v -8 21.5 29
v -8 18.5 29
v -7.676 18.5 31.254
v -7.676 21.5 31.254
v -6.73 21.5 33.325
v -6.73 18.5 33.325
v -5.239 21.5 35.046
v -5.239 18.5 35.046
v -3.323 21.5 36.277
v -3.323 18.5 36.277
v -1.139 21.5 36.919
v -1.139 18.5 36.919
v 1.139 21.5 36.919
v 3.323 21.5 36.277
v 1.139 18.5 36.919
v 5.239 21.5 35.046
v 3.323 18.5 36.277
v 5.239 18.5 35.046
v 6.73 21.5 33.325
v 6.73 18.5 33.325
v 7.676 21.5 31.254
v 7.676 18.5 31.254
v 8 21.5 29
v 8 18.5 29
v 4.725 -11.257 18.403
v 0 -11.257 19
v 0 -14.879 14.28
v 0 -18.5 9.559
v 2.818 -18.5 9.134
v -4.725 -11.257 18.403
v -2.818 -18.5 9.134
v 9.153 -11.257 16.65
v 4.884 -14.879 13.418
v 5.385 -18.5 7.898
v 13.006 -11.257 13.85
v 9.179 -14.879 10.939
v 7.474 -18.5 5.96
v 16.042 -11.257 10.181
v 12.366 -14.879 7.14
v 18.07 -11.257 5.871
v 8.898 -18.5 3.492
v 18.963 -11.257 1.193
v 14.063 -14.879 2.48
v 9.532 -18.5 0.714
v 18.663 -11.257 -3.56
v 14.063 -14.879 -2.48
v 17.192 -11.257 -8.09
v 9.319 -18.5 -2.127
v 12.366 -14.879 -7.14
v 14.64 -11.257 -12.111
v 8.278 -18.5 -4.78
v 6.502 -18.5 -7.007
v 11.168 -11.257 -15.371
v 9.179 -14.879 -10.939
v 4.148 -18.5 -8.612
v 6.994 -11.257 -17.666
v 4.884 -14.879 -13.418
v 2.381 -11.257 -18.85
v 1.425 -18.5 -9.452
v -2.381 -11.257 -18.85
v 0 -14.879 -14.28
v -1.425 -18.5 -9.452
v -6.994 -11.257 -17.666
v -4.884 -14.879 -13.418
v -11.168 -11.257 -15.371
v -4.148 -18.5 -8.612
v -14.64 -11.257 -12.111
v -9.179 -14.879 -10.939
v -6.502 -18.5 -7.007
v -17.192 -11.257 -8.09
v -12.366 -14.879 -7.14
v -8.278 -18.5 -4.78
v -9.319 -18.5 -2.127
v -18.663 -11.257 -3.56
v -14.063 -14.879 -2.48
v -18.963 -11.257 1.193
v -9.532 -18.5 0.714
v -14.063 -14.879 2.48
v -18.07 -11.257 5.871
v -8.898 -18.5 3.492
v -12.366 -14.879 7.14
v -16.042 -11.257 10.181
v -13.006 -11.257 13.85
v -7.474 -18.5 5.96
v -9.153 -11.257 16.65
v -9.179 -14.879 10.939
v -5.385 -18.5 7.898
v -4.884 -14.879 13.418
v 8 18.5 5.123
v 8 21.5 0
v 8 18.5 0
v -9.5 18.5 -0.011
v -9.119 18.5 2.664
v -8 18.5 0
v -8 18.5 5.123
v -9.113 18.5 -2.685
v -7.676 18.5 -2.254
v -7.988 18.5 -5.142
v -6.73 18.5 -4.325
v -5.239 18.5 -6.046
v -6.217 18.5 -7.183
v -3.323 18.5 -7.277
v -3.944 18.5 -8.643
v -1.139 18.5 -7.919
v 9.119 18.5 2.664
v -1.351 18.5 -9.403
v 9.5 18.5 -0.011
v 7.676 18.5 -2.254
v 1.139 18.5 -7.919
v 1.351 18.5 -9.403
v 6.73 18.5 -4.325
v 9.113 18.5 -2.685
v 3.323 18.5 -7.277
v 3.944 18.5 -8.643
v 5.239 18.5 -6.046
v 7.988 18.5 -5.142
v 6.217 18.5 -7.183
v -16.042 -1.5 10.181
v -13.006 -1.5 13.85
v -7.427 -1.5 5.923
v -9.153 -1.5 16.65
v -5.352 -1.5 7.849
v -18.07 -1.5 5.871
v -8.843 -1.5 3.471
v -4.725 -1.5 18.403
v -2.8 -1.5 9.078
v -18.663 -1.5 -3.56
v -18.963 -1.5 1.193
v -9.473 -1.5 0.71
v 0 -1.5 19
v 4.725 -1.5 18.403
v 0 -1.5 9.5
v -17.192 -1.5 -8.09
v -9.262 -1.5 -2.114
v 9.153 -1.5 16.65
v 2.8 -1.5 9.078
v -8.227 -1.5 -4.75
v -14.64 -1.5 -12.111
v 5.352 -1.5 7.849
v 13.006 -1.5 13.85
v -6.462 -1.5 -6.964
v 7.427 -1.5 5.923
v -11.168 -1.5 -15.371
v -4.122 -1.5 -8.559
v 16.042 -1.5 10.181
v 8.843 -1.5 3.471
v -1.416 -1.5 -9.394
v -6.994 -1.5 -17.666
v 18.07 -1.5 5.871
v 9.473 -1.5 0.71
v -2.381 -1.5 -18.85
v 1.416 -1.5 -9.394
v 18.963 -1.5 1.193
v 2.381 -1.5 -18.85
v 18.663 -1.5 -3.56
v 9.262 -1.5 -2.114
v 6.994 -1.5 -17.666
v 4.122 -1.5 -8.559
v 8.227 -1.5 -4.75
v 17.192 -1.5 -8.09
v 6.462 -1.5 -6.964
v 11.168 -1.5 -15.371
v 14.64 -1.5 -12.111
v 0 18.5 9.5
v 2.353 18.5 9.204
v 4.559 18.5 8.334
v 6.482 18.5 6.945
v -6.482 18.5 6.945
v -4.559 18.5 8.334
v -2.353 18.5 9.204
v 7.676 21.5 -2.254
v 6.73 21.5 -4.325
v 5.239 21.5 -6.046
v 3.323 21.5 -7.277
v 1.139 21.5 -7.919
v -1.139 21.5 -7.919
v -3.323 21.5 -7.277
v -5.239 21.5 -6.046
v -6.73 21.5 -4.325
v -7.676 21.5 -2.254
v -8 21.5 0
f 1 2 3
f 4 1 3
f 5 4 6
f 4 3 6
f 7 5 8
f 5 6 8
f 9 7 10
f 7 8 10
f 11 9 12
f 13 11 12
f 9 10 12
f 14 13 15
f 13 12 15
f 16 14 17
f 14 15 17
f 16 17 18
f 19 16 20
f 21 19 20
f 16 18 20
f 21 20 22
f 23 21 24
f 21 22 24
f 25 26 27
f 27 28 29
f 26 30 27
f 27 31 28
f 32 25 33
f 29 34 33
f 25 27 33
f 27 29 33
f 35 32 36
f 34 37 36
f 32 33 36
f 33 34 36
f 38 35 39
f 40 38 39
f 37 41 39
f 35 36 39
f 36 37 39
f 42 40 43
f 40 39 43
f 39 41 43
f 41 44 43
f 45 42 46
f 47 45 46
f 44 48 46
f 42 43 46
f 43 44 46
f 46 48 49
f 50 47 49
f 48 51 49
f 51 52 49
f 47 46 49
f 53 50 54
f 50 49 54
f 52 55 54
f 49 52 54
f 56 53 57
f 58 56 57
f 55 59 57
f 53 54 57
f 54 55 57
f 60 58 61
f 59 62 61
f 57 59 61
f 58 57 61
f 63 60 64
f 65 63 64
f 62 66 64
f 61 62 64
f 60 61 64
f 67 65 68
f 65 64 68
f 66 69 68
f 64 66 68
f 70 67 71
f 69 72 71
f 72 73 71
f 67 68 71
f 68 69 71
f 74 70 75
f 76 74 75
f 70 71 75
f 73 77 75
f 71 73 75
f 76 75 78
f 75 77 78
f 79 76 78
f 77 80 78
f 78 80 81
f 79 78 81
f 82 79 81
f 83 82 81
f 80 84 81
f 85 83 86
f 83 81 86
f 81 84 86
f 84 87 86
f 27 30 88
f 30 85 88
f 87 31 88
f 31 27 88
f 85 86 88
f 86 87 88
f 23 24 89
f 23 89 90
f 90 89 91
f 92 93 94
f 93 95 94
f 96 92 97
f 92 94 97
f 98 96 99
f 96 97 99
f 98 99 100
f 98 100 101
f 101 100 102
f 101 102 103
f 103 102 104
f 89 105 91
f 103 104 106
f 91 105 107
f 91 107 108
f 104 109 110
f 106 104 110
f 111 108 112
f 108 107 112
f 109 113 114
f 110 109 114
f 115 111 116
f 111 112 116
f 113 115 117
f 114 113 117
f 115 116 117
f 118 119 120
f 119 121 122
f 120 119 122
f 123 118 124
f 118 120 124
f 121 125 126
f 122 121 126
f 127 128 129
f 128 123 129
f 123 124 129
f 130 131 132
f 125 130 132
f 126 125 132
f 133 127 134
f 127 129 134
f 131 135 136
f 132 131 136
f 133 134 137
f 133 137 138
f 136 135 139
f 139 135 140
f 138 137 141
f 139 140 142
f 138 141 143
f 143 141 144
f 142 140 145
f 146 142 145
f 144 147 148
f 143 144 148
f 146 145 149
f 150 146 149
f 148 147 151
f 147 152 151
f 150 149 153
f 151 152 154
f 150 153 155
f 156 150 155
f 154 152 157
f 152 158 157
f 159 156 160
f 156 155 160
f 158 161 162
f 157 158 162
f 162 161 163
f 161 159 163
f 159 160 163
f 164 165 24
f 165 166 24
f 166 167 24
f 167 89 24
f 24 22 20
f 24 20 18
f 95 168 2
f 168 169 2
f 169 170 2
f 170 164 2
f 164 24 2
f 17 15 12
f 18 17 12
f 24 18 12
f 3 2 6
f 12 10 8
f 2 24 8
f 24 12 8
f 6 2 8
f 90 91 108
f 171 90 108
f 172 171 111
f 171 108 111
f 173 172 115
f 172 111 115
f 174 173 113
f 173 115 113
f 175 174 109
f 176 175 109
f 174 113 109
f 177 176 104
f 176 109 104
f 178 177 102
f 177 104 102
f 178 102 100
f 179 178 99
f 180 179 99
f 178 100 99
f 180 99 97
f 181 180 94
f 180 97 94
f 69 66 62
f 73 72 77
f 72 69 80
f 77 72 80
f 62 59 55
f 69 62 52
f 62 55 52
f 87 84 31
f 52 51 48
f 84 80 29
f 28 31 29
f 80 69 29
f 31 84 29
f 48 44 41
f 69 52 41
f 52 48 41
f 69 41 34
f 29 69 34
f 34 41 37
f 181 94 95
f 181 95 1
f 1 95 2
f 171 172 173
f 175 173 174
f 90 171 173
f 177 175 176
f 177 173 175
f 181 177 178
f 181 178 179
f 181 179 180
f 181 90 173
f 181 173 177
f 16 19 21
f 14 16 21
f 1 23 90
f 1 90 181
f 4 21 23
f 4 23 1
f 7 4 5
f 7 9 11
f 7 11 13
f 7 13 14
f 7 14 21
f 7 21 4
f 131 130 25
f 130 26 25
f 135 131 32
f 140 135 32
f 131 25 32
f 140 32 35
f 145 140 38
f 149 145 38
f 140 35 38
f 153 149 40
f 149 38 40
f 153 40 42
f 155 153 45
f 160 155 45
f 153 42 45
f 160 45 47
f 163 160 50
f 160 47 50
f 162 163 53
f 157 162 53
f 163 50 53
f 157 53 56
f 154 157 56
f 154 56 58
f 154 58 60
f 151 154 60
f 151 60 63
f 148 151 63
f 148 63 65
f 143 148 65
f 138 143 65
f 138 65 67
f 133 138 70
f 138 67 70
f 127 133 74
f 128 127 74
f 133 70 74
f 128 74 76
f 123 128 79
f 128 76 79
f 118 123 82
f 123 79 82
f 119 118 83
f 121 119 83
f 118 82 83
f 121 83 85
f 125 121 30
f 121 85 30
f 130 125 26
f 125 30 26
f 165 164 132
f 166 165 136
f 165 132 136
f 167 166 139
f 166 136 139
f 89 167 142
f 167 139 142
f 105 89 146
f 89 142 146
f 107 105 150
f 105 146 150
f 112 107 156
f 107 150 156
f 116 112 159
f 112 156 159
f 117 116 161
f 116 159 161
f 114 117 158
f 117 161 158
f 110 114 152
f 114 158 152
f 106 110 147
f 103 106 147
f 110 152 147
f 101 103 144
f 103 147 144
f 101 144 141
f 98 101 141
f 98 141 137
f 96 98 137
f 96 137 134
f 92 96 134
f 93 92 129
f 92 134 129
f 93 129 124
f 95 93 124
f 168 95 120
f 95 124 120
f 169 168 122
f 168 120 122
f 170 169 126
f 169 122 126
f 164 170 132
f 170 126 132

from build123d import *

# Parameters (mm, degrees)
F3_DEPTH = 3


with BuildPart() as f1:
    # F0 (on Right) → F1 (revolve)
    with BuildSketch(Plane.YZ):
        Polygon((-18.5, 9.559073), (-18.5, 0), (18.5, 0), (18.5, 9.5), (-1.5, 9.5), (-1.5, 19), (-11.25722, 19), align=None)
    revolve(axis=Axis((0, -2.898404, 0), (0, 1, 0)))

    # F2 (on face) → F3 (join)
    with BuildSketch(Plane(origin=(0, 18.5, 0), x_dir=(-1, 0, 0), z_dir=(0, 1, 0))):
        with BuildLine():
            ThreePointArc((8, 29), (0, 37), (-8, 29))
            Line((-8, 29), (-8, 5.123475))
            ThreePointArc((-8, 5.123475), (0, 9.5), (8, 5.123475))
            Line((8, 5.123475), (8, 29))
        make_face()
        with BuildLine():
            ThreePointArc((8, 5.123475), (0, 9.5), (-8, 5.123475))
            Line((-8, 5.123475), (-8, 0))
            ThreePointArc((-8, 0), (0, -8), (8, 0))
            Line((8, 0), (8, 5.123475))
        make_face()
    extrude(amount=F3_DEPTH)


solid = f1.part
